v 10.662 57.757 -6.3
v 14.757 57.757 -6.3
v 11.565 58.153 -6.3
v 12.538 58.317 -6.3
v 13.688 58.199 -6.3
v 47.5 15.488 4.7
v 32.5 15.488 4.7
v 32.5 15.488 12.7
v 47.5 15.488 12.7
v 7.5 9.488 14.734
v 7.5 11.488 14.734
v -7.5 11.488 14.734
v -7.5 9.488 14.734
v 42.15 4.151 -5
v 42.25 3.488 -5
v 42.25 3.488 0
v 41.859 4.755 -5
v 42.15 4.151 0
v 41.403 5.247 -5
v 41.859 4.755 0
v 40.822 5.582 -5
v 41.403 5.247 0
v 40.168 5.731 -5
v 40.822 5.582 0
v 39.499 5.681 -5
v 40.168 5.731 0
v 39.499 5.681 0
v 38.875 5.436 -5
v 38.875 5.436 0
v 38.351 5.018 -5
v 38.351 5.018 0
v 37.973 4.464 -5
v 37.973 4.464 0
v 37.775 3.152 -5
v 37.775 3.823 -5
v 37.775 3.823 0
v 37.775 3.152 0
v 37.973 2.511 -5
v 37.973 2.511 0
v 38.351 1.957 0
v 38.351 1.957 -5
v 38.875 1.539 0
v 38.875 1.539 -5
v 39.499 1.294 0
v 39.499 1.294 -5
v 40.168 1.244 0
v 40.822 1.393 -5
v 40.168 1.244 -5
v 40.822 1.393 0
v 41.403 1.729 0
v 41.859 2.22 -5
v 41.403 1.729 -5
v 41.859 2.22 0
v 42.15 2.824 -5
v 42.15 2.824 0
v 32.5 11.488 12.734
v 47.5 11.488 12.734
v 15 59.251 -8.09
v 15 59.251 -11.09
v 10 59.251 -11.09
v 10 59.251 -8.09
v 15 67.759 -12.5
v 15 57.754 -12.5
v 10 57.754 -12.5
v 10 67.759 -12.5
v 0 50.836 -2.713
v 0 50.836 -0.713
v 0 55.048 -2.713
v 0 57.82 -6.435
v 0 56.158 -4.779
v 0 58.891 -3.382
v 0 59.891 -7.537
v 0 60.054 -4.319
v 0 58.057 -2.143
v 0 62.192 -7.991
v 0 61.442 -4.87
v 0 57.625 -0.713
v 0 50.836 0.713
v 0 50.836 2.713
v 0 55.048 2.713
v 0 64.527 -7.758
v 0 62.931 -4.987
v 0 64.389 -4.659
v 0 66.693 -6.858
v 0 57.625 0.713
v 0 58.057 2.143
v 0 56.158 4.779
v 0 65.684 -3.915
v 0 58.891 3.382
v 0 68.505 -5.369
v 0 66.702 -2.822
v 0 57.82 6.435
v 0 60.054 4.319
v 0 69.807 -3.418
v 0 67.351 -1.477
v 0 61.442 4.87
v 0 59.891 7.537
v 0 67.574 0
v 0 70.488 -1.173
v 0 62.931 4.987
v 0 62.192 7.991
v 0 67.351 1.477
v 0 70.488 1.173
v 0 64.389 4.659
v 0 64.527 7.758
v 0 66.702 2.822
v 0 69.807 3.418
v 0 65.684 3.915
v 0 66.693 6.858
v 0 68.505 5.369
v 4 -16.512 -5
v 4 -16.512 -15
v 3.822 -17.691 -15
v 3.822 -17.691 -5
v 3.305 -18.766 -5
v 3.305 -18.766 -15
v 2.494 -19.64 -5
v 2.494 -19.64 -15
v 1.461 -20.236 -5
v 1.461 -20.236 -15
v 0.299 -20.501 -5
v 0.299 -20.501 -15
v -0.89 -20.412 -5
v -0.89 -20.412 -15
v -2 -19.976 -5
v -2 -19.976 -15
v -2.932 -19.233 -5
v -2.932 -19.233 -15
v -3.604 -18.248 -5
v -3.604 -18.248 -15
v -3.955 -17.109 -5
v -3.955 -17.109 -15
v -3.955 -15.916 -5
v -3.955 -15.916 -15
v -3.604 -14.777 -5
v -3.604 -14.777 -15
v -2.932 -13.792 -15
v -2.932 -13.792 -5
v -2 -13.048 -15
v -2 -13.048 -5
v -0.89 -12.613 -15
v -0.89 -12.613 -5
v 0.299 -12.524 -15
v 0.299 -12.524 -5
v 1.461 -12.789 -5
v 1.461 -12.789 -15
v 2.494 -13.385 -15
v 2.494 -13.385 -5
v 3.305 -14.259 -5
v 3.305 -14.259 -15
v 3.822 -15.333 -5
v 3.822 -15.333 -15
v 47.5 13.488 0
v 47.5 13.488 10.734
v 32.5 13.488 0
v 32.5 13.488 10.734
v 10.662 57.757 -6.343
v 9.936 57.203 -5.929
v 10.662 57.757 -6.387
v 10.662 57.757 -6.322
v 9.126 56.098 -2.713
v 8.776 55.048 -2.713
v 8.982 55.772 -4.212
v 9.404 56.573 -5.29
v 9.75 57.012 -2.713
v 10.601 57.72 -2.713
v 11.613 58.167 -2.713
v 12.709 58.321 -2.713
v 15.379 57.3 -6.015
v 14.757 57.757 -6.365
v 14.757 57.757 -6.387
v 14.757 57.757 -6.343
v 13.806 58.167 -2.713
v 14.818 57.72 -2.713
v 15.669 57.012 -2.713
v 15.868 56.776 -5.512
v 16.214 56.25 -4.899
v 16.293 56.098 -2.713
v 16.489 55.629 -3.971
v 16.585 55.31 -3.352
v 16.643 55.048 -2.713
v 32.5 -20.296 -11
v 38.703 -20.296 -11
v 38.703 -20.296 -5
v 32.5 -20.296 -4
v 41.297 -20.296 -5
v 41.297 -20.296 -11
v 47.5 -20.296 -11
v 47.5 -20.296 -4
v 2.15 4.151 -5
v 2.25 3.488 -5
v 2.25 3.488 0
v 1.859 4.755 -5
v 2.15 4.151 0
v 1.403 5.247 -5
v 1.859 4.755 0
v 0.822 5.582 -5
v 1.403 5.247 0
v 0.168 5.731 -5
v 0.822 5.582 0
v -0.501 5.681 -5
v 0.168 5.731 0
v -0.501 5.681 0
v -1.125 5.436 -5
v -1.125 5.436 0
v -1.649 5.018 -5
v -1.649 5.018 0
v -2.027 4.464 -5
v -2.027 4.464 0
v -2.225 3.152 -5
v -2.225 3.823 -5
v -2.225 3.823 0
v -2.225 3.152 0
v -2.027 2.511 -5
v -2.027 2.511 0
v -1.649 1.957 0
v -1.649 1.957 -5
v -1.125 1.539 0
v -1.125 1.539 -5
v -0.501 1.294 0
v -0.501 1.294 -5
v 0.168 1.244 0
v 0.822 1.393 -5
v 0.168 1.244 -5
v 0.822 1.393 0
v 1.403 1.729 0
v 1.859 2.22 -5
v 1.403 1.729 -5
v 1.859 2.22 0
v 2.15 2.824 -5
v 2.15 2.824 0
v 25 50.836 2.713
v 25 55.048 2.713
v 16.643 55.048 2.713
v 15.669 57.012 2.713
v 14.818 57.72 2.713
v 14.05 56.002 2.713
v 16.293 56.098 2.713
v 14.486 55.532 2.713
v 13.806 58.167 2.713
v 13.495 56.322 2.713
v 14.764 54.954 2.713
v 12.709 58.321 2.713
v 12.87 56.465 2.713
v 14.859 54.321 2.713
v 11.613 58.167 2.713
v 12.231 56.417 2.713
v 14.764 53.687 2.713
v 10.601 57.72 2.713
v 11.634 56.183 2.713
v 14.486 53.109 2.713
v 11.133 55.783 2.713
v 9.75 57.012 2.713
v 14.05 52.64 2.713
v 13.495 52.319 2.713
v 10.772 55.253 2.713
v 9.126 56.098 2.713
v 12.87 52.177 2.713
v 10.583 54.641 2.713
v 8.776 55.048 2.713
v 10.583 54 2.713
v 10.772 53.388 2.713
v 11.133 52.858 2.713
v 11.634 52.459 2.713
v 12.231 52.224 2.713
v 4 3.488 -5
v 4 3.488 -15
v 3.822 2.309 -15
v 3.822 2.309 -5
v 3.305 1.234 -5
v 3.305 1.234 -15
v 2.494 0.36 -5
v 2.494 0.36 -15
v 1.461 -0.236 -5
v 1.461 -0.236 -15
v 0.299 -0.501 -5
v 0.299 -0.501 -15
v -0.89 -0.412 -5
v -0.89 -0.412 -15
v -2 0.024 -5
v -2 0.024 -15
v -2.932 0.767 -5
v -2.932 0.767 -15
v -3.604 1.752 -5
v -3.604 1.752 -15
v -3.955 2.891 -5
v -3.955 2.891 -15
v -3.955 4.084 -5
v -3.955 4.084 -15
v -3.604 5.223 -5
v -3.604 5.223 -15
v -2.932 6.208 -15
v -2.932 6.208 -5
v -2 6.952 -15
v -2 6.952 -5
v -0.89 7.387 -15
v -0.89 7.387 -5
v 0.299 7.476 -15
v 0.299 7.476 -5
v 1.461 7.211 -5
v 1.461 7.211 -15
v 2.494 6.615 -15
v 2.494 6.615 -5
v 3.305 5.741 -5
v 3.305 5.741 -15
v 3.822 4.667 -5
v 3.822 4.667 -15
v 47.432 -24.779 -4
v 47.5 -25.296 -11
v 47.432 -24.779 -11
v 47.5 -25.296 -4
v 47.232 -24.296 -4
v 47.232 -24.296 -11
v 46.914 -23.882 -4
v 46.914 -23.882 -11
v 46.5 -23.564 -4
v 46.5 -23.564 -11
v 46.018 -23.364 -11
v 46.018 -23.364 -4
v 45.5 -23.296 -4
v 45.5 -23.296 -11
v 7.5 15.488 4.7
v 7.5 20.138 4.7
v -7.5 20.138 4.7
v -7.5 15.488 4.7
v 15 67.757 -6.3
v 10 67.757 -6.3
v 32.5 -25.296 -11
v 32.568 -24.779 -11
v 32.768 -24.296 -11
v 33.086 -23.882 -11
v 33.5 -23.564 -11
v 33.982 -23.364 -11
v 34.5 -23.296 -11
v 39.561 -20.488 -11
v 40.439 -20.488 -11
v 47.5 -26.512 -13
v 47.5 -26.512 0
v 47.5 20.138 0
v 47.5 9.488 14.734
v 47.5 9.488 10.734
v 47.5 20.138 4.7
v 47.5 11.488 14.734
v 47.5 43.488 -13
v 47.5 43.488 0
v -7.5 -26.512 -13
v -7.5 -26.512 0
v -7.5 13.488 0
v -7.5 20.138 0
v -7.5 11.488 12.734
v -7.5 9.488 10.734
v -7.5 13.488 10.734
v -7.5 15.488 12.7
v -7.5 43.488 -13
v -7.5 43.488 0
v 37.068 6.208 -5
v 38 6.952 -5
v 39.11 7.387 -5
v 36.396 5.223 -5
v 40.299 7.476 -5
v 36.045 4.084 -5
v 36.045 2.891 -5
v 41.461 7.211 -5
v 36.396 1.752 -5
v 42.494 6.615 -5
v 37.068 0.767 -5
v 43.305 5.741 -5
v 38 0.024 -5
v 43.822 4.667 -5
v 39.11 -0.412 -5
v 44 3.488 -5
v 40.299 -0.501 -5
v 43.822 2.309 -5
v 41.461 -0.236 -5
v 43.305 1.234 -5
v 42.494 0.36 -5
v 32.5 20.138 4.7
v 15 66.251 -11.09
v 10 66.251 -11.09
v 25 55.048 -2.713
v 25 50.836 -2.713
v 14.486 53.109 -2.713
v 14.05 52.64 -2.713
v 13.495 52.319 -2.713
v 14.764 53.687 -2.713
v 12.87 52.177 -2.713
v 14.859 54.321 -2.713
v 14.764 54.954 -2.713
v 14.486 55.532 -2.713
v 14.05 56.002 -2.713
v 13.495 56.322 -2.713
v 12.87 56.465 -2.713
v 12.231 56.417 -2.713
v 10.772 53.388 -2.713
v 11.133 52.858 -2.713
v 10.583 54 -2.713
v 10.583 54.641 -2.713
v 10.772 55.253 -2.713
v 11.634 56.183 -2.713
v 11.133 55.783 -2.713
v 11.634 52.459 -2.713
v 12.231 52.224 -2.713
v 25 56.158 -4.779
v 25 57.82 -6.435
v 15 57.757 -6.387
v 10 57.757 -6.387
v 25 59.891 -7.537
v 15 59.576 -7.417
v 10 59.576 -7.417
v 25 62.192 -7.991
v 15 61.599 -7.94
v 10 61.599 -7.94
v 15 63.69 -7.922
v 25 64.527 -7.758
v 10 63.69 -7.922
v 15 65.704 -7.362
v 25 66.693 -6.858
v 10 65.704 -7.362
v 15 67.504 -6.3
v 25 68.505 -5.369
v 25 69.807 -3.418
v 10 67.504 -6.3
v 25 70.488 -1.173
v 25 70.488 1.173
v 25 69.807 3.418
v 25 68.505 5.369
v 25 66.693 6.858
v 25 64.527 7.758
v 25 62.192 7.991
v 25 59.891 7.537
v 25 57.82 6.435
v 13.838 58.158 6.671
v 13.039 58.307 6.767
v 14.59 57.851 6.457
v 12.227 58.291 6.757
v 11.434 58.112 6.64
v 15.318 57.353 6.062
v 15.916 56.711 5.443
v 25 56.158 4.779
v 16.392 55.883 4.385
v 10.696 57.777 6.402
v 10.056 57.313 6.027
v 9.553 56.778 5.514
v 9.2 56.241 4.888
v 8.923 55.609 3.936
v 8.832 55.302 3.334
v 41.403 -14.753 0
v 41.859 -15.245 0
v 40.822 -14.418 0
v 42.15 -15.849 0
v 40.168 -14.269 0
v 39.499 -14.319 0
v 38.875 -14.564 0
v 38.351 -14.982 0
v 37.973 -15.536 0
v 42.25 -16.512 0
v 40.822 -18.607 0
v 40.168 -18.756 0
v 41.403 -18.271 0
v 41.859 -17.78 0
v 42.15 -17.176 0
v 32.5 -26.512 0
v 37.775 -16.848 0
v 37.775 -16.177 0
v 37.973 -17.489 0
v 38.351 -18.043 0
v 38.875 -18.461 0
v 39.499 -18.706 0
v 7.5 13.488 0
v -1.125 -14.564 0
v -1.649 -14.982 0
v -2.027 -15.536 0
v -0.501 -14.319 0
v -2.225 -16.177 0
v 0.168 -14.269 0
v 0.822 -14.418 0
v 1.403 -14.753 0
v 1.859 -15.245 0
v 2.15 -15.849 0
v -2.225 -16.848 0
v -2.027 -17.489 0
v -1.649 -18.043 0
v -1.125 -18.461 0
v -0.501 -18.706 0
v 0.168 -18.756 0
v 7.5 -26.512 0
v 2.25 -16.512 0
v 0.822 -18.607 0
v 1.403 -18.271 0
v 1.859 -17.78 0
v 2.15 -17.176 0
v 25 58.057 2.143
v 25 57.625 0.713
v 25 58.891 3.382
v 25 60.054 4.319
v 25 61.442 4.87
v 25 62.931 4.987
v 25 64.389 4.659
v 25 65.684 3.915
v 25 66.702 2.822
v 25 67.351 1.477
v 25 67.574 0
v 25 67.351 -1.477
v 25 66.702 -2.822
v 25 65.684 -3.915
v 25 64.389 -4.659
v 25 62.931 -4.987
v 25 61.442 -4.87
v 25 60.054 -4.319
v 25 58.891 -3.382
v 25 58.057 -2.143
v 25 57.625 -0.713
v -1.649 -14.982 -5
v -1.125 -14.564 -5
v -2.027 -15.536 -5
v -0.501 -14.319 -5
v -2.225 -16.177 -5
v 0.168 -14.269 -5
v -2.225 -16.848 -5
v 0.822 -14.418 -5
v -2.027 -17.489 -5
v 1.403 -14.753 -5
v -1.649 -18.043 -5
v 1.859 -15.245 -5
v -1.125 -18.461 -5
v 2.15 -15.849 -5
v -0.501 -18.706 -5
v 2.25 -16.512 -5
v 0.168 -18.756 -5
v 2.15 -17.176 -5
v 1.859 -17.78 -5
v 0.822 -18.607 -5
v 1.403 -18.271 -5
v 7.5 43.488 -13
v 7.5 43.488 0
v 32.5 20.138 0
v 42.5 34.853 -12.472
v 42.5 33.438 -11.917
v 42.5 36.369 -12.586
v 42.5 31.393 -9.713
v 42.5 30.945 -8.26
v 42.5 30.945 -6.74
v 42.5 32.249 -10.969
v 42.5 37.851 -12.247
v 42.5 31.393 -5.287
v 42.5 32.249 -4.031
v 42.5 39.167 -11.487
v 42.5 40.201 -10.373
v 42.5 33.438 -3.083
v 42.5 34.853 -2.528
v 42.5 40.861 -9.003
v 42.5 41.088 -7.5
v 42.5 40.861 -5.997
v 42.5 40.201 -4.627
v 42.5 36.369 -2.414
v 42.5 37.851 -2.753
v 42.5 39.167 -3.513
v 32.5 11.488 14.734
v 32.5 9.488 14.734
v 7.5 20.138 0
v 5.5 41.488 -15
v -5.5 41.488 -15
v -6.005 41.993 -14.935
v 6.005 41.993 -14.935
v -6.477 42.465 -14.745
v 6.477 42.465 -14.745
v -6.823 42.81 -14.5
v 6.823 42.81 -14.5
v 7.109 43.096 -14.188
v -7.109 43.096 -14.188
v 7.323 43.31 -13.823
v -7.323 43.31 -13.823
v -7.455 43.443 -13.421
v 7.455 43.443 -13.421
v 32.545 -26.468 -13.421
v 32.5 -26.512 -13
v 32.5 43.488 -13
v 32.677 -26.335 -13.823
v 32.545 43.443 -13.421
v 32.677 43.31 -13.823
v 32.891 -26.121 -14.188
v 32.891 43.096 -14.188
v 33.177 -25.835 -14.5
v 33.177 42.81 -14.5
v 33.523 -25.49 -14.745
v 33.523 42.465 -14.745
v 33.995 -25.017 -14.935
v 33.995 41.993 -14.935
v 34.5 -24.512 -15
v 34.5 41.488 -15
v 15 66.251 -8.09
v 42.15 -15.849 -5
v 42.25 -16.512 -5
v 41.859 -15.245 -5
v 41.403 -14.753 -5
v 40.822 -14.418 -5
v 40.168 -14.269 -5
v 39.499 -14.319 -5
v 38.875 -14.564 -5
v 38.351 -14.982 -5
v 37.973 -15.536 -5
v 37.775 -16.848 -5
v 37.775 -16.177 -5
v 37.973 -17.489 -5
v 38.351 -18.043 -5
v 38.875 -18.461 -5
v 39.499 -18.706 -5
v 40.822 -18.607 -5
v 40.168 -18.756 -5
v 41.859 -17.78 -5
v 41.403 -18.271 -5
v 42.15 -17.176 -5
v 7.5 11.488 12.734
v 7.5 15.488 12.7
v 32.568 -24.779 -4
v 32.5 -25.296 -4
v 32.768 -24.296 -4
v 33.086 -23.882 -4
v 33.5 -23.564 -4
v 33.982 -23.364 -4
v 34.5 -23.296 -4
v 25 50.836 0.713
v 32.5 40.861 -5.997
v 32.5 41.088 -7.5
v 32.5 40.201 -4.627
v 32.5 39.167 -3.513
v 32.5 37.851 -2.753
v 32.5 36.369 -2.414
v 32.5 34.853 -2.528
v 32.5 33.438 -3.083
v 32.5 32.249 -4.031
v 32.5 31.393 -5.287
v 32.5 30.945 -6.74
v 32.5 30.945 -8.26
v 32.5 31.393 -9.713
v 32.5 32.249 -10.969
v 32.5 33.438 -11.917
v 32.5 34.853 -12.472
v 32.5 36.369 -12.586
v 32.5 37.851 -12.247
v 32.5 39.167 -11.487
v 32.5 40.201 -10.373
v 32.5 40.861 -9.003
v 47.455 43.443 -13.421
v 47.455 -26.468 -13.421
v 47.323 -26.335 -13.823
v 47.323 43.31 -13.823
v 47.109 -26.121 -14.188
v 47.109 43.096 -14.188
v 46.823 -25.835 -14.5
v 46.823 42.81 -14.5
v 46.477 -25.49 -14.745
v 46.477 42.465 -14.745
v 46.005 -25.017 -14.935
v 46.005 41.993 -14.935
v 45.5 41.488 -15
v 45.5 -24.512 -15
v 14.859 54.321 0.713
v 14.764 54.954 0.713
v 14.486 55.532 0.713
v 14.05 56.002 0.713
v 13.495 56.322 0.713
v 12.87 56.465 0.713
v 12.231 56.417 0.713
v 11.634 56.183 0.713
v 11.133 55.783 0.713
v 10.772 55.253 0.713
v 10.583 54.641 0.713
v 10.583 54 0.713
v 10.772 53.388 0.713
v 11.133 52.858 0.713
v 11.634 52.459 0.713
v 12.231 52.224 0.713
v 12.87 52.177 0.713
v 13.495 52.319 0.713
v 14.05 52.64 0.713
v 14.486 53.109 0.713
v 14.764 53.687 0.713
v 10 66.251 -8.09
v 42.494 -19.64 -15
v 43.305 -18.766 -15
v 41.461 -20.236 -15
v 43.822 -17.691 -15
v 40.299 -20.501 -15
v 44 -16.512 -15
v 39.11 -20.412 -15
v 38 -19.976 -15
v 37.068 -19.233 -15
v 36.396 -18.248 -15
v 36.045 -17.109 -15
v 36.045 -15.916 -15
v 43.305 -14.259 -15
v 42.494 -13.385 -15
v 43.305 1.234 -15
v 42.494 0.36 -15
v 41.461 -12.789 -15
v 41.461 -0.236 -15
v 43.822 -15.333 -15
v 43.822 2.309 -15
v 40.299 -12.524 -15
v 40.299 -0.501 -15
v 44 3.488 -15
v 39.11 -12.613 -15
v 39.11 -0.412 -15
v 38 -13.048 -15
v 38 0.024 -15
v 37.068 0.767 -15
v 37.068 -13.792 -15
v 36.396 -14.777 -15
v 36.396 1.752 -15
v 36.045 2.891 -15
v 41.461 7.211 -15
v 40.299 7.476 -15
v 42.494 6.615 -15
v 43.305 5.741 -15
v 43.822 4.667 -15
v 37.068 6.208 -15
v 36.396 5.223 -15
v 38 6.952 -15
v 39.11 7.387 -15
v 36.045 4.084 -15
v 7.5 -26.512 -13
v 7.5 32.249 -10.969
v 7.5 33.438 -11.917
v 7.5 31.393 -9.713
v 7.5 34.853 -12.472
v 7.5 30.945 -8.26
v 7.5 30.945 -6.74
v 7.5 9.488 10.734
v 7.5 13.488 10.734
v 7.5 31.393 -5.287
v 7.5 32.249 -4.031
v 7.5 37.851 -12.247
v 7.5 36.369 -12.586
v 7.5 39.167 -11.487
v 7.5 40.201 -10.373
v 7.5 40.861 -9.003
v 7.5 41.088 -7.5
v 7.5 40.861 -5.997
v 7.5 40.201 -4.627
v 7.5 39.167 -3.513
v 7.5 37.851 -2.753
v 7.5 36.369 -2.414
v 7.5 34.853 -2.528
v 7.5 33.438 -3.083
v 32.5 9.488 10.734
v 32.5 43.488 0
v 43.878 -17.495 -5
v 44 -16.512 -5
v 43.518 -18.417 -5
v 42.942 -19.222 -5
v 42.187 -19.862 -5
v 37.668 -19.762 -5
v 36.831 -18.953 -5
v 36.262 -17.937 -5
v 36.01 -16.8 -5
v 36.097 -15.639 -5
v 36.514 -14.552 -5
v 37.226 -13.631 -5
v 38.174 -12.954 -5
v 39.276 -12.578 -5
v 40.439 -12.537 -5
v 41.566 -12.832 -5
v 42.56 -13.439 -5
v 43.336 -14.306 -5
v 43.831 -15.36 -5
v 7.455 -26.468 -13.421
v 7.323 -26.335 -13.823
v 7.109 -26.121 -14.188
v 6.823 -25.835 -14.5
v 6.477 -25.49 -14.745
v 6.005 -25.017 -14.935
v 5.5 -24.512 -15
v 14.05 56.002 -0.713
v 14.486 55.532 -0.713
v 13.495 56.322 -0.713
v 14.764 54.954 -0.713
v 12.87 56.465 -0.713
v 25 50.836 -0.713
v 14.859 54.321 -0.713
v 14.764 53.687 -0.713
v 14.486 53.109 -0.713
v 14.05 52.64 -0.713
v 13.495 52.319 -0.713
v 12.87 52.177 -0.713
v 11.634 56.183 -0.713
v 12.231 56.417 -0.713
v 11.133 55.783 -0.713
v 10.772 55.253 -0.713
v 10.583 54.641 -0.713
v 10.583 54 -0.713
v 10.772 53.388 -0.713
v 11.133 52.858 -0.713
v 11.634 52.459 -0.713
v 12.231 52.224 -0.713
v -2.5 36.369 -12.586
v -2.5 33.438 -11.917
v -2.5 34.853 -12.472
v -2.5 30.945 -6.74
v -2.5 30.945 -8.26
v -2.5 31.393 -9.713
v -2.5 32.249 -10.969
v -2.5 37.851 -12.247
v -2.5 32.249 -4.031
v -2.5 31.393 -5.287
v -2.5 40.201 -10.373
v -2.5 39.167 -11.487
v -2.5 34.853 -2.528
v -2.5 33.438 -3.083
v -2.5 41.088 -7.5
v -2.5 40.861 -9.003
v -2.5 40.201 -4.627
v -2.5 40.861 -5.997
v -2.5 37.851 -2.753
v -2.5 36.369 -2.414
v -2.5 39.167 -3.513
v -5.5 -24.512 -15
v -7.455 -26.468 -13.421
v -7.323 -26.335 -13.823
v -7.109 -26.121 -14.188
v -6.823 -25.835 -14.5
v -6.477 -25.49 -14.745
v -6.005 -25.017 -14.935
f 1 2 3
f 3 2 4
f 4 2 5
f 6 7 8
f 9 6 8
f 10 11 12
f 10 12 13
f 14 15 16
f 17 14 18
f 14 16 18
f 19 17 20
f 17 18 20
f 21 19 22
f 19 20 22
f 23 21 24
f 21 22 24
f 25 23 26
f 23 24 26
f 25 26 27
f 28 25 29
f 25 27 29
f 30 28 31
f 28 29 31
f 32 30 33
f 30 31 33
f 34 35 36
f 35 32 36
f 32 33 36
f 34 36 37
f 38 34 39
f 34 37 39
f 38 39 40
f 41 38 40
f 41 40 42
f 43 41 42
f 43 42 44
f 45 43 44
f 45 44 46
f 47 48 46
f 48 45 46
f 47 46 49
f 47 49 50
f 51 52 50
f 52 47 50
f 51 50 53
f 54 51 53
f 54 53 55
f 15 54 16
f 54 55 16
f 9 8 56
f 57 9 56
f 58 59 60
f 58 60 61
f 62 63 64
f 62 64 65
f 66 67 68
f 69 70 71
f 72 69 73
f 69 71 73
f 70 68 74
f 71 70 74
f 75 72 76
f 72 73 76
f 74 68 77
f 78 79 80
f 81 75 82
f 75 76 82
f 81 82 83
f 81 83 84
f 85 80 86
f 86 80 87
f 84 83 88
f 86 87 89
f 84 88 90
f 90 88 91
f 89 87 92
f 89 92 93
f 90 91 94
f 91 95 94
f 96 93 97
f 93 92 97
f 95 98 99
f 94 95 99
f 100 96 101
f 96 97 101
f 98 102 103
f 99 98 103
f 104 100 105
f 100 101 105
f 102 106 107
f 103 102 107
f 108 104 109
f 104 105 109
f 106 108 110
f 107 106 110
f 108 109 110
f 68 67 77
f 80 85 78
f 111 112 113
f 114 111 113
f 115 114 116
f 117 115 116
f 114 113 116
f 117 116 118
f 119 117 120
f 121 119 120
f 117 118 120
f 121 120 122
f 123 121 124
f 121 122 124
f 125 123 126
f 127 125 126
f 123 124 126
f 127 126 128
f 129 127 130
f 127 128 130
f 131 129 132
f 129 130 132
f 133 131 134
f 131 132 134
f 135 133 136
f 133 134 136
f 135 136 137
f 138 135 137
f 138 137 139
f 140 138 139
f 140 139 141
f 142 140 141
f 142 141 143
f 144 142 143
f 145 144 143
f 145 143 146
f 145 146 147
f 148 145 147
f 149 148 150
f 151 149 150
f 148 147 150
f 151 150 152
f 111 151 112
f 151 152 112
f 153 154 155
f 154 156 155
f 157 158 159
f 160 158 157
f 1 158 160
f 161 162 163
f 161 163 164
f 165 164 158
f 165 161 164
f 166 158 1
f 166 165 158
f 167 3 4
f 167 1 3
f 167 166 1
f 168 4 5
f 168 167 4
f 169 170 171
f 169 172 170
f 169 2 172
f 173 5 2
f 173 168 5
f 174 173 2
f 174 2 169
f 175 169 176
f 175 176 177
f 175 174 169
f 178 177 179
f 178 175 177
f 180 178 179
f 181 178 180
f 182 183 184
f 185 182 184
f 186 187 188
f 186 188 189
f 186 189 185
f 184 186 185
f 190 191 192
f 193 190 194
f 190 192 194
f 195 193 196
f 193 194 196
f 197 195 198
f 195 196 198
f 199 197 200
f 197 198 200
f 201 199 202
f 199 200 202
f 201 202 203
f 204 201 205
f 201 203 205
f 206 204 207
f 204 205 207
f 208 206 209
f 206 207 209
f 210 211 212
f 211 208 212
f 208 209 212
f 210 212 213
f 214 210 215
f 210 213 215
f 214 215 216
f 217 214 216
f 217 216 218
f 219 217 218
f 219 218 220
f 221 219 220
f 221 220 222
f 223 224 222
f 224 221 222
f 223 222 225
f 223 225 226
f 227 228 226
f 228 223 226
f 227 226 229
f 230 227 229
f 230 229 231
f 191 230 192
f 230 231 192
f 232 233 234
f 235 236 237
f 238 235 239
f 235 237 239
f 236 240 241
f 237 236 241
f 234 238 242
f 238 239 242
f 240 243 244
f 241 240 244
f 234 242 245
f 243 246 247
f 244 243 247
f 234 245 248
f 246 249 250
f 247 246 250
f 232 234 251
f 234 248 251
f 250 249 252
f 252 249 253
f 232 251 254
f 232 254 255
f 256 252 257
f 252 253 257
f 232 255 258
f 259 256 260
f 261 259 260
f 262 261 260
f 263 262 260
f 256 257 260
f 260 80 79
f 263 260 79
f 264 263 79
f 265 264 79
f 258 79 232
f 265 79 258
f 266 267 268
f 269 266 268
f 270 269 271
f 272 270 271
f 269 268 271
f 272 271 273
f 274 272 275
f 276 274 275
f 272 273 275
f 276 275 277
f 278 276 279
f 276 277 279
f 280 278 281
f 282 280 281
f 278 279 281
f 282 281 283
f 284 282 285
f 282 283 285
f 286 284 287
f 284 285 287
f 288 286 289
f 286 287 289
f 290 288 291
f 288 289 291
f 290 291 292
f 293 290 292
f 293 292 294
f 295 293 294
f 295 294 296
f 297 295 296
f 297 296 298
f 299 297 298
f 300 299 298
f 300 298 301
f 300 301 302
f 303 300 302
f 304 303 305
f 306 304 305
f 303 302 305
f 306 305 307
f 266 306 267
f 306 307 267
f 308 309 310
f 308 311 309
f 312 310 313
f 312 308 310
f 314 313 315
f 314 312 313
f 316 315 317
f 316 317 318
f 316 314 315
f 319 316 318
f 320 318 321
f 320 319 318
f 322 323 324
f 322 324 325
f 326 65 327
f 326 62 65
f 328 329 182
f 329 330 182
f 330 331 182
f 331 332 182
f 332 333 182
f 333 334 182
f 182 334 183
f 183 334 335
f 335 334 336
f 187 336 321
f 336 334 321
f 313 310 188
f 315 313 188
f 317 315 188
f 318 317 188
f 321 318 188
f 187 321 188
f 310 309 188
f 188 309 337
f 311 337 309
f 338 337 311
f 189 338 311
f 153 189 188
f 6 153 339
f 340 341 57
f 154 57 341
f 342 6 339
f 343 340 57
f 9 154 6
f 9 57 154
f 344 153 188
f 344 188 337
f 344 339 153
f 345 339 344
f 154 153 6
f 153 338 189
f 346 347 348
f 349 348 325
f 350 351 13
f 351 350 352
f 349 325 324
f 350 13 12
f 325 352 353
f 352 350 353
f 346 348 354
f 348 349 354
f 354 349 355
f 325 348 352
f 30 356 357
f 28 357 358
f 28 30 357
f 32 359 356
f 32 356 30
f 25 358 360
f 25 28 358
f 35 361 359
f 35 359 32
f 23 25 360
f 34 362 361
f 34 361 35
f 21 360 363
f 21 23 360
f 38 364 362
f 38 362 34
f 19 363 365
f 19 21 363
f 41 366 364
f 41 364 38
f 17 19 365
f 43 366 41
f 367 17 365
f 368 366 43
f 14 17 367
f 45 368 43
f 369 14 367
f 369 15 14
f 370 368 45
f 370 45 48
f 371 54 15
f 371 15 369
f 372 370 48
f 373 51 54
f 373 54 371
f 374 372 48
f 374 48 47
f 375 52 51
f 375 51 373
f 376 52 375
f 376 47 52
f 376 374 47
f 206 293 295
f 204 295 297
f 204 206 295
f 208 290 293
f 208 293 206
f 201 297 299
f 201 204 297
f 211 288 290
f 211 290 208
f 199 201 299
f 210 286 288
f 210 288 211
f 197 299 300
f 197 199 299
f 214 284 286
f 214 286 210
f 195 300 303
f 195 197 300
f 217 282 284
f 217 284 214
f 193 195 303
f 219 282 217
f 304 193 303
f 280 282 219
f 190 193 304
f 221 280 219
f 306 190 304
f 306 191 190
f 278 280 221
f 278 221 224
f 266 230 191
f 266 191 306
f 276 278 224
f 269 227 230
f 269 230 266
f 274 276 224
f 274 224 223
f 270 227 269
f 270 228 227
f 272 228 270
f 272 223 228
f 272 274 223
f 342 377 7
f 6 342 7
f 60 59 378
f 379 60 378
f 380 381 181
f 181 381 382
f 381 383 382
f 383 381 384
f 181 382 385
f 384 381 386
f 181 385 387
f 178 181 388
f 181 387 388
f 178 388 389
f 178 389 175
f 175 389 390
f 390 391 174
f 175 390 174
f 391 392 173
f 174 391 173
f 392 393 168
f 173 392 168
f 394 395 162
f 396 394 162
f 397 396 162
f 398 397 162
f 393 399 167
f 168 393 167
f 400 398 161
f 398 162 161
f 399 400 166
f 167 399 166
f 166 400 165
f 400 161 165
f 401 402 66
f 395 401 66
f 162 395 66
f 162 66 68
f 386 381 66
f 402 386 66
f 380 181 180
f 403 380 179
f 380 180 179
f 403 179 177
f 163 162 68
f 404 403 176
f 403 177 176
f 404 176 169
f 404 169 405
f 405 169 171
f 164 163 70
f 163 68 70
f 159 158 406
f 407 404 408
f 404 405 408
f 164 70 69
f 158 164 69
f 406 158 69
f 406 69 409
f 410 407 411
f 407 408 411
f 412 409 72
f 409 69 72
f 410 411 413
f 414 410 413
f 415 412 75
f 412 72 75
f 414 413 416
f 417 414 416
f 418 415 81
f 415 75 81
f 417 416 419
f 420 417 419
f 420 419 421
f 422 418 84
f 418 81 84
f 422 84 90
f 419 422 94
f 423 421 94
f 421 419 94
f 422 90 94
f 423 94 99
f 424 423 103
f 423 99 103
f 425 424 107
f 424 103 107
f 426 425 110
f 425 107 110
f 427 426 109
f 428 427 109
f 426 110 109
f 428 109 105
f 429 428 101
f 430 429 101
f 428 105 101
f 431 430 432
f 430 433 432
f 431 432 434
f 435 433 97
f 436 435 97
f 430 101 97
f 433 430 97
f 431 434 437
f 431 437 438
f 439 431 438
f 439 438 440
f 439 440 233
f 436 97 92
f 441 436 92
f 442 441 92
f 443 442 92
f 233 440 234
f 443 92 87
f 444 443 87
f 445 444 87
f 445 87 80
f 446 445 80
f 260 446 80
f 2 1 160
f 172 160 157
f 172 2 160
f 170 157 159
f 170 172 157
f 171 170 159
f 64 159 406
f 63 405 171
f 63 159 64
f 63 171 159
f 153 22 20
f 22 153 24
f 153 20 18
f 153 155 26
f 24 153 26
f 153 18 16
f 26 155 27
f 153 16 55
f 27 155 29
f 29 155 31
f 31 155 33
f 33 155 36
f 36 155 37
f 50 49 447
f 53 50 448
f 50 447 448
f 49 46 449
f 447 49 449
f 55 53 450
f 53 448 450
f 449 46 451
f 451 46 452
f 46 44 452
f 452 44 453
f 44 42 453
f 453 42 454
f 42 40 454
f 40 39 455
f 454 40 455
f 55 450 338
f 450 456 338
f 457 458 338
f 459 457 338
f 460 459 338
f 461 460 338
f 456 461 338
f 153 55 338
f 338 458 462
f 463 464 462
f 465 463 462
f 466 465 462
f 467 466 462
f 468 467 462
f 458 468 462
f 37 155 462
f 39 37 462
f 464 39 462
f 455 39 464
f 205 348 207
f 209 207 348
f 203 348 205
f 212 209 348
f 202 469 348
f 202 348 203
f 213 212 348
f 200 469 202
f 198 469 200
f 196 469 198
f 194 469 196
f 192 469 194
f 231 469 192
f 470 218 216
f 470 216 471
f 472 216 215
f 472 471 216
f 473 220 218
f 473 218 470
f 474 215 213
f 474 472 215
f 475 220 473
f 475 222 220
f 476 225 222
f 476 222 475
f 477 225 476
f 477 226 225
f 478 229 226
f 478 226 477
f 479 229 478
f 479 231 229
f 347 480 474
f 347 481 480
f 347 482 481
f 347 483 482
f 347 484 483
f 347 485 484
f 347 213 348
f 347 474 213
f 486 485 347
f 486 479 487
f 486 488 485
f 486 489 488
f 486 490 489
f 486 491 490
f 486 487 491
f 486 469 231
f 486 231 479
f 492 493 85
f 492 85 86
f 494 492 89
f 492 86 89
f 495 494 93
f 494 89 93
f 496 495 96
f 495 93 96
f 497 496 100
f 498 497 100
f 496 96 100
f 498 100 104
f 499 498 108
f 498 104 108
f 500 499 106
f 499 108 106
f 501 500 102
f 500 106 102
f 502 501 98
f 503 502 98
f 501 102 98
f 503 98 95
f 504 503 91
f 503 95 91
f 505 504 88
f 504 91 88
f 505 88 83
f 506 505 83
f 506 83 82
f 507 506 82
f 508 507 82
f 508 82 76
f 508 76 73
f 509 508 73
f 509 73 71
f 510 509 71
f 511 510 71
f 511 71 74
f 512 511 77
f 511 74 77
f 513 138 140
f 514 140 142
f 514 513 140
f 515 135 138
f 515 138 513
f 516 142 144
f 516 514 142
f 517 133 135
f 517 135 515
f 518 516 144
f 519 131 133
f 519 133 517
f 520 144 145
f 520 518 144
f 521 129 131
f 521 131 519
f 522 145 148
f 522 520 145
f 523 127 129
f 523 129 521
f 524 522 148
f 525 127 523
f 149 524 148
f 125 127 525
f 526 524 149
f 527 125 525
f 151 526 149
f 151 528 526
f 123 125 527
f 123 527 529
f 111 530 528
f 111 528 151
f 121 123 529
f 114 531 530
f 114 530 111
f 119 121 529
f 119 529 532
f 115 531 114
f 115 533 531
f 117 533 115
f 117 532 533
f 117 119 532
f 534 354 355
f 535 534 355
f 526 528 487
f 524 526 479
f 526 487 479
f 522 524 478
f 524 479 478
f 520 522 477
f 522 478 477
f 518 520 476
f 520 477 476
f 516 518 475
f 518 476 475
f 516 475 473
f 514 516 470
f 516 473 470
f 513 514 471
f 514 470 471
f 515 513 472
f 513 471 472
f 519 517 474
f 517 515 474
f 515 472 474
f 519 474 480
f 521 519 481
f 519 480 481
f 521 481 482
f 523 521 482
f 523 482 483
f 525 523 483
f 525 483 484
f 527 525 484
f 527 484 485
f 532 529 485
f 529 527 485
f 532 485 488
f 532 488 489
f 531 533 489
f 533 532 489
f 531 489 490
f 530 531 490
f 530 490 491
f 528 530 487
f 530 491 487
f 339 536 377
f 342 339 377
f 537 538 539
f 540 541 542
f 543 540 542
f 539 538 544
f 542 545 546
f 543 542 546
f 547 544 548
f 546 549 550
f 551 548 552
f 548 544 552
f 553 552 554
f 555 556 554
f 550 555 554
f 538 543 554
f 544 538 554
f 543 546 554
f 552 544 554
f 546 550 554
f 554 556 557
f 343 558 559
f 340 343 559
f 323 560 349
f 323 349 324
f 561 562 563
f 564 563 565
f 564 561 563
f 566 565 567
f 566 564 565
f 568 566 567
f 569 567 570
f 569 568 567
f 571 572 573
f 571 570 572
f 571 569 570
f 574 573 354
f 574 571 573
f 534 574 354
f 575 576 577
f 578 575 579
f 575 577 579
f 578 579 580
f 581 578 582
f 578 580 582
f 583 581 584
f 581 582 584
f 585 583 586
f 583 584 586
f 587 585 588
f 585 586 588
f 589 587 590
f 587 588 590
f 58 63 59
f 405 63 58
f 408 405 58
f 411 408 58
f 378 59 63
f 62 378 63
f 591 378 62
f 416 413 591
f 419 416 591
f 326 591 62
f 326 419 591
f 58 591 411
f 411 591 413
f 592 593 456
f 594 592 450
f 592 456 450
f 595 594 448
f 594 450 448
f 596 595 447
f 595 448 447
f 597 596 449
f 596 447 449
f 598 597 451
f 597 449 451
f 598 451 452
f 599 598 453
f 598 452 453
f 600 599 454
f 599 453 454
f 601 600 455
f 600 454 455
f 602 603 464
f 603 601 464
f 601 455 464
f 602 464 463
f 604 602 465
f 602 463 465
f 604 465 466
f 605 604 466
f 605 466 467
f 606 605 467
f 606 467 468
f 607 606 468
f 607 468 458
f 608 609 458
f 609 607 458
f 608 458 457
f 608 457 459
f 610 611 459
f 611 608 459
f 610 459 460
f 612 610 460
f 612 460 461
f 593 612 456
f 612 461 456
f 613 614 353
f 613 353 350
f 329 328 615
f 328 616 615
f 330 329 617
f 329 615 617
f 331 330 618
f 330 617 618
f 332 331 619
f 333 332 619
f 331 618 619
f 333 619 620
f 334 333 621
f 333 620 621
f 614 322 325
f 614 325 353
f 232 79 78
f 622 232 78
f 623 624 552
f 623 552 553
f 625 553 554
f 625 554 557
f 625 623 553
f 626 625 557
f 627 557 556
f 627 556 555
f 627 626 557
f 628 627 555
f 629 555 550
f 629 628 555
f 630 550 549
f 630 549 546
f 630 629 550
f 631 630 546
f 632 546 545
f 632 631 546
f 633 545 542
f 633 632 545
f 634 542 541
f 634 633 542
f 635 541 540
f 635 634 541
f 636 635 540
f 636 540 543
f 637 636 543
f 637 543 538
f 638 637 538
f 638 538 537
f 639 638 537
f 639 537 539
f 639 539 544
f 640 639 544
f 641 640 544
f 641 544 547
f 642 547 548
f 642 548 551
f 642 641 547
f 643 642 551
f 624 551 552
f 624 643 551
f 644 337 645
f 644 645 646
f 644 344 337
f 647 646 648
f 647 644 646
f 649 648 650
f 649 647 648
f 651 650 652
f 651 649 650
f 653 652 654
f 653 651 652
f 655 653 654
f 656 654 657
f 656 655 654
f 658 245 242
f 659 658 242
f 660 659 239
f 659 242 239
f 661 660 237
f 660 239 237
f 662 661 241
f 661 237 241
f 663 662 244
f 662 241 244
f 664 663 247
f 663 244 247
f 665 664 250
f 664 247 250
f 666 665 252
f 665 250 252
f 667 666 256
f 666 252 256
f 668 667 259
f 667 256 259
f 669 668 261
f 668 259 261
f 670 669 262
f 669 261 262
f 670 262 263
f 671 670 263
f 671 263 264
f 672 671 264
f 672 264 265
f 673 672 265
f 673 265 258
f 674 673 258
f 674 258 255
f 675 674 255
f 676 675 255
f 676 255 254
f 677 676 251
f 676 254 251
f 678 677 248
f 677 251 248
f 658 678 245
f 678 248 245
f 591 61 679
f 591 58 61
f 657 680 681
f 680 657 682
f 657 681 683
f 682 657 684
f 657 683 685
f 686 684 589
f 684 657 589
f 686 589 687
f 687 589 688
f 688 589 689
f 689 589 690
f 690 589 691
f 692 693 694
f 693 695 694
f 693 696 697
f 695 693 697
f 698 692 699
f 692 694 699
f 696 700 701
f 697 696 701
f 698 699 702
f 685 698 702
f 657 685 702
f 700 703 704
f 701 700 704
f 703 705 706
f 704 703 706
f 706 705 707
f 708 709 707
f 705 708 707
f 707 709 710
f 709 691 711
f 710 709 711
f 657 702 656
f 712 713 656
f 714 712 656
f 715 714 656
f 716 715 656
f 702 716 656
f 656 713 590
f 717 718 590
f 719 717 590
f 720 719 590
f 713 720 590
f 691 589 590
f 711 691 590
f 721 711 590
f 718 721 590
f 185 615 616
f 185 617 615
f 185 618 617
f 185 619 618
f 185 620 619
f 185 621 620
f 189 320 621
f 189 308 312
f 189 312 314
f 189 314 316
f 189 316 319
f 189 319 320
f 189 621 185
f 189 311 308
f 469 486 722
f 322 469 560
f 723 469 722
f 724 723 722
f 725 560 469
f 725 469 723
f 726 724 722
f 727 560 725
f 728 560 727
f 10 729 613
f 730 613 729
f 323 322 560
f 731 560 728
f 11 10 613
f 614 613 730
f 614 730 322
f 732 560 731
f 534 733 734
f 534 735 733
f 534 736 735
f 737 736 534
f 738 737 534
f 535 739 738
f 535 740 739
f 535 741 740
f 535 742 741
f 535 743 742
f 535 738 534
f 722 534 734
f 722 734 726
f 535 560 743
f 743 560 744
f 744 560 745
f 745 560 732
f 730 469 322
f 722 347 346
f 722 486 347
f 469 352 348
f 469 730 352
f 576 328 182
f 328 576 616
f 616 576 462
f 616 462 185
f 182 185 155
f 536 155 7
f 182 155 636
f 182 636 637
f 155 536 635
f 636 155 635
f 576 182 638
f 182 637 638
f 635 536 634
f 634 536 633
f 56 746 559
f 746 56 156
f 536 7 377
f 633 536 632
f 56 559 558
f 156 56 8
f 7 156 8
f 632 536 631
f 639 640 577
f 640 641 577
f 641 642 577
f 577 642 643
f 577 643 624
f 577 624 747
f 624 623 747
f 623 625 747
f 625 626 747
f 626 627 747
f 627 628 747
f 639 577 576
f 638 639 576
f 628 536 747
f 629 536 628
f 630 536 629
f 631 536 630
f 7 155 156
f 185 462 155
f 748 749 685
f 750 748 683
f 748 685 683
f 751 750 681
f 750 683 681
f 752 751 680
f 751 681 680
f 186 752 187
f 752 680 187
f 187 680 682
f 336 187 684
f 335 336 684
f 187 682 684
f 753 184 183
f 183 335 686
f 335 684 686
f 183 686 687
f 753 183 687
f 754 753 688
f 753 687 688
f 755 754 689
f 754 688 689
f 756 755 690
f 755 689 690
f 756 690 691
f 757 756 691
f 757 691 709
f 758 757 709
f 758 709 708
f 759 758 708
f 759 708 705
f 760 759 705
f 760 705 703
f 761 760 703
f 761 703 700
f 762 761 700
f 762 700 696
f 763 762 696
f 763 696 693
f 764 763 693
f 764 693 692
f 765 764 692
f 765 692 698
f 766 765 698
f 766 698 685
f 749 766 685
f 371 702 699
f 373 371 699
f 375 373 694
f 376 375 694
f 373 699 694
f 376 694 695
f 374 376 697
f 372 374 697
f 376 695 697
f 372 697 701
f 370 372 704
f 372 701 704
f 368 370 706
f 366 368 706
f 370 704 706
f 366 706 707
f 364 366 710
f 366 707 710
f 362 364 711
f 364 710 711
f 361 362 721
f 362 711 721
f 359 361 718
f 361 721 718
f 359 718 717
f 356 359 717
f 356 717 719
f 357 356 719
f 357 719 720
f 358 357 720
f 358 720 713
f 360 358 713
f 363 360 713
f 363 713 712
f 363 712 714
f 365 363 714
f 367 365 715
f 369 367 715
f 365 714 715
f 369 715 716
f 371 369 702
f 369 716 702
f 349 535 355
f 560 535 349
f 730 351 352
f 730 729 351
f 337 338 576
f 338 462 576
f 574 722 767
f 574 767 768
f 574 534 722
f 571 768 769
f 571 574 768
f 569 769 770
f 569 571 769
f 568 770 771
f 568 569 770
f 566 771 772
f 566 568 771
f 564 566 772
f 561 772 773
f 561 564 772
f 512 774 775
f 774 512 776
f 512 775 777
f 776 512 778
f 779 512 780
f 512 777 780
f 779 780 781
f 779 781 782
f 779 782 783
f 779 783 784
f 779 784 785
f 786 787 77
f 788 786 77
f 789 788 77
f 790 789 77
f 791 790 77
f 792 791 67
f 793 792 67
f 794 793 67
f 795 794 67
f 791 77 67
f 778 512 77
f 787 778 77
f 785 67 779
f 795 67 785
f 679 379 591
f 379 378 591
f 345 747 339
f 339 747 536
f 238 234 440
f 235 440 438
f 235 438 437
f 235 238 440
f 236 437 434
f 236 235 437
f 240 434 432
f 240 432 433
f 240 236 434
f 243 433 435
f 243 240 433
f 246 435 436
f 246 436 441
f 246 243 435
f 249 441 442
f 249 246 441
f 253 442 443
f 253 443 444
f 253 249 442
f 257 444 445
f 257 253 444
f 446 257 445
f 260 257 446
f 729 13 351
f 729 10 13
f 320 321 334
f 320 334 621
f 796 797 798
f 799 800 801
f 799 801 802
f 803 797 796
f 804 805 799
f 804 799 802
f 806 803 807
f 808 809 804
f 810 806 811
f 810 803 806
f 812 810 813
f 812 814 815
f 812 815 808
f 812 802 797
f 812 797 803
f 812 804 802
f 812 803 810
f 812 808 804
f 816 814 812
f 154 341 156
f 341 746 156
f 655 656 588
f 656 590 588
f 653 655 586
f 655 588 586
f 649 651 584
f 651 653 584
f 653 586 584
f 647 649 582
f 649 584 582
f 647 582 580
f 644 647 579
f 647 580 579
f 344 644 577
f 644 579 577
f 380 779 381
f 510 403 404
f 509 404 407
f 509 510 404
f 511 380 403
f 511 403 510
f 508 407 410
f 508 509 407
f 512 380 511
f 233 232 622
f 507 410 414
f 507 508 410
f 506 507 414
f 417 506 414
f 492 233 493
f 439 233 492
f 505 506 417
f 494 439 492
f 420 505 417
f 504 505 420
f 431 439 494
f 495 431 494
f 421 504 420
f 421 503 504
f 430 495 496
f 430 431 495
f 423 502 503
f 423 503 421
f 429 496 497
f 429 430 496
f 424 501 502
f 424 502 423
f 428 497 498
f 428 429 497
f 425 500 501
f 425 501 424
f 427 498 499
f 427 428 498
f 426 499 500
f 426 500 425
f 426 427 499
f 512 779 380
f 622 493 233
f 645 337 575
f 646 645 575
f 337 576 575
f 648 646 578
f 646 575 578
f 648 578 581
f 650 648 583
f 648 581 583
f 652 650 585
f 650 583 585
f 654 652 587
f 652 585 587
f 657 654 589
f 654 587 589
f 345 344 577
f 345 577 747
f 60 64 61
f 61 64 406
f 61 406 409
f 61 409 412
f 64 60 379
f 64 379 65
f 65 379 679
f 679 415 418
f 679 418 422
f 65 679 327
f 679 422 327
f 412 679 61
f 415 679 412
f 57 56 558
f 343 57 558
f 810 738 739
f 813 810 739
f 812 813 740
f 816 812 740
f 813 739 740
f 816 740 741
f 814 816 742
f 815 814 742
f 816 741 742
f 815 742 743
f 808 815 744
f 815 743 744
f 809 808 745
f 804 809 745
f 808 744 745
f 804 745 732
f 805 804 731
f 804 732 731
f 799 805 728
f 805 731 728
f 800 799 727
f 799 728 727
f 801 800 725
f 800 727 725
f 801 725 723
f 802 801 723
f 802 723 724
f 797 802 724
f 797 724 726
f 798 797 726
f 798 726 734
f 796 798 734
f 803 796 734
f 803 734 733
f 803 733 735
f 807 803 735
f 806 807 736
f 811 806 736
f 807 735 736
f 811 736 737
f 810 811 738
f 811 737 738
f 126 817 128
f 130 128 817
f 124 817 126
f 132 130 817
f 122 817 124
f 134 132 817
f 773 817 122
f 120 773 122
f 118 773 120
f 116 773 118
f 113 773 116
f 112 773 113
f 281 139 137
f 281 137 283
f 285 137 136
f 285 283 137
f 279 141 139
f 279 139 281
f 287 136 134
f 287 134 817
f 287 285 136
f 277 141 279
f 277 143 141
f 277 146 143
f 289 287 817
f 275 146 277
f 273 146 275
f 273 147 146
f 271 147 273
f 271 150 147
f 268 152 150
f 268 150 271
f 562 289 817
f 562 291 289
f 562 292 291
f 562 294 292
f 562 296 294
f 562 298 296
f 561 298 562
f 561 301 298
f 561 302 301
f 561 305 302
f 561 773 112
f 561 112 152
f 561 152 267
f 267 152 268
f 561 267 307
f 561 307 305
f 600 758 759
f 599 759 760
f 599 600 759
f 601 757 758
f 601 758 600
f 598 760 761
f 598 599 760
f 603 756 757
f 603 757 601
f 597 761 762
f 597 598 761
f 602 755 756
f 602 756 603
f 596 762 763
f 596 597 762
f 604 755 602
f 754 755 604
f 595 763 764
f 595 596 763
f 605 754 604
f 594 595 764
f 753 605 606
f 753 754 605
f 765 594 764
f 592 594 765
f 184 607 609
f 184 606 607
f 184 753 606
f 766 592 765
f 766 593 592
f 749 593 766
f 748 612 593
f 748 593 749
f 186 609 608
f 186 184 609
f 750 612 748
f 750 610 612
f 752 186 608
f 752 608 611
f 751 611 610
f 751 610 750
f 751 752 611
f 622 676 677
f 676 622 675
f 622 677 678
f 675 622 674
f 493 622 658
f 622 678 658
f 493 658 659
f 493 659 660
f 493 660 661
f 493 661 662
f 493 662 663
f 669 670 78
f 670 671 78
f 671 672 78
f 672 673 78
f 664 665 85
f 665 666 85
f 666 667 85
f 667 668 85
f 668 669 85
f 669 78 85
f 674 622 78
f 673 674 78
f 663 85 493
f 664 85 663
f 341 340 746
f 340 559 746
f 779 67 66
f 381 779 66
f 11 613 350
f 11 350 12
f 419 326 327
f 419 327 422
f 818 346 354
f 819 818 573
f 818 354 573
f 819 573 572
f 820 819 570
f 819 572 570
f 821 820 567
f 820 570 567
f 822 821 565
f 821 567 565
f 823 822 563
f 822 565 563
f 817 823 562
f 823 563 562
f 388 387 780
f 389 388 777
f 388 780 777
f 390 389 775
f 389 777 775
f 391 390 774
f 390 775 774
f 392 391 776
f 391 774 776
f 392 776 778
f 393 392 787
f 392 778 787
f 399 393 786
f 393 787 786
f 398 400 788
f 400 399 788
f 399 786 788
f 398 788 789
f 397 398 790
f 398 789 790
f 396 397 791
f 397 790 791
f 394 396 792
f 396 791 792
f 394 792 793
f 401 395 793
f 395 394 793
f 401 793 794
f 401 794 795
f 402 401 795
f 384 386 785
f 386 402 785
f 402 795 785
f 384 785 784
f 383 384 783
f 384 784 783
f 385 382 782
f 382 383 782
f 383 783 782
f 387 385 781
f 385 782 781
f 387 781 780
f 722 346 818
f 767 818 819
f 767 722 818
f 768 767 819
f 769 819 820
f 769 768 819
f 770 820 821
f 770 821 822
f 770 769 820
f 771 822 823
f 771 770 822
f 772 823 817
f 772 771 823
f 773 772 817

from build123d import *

# Parameters (mm, degrees)
F2_DEPTH  = 7.5
F3_R      = 5.1
F4_DEPTH  = 10
F7_W      = 3
F7_H      = 7
F8_DEPTH  = 15
F9_R      = 2
F9_2_R    = 2
F10_R     = 2.25
F11_DEPTH = 15
F12_R     = 2.25
F13_DEPTH = 15
F14_R     = 4
F14_R_2   = 2.25
F15_DEPTH = 10
F16_R     = 4
F16_R_2   = 2.25
F17_DEPTH = 10
F19_DEPTH = 25
F20_R     = 2.15
F21_DEPTH = 12.5
F22_R     = 4
F23_DEPTH = 25
F24_R     = 4
F25_DEPTH = 25
F27_W     = 7
F27_H     = 3
F28_DEPTH = 2.5


with BuildPart() as f2:
    # F1 (on Right) → F2 (new body, symmetric)
    with BuildSketch(Plane.YZ):
        Polygon((13.4876342118, 10.7337733775), (13.4876342118, 0), (-26.5123657882, 0), (-26.5123657882, -15), (18.4876342118, -15), (43.4876342118, -15), (43.4876342118, 0), (20.1378133701, 0), (20.1378133701, 4.7), (15.4876342118, 4.7), (15.4876342118, 12.7), (11.4876342118, 12.7337733775), (11.4876342118, 14.7337733775), (9.4876342118, 14.7337733775), (9.4876342118, 10.7337733775), align=None)
    extrude(amount=F2_DEPTH, both=True)

    # F3 (on face) → F4 (cut)
    with BuildSketch(Plane.YZ.offset(7.5)):
        with Locations((35.9876342118, -7.5)):
            Circle(F3_R)
    extrude(amount=-F4_DEPTH, mode=Mode.SUBTRACT)


with BuildPart() as f6_1:
    # F6: instance of F2
    add(f2.part.mirror(Plane.YZ.offset(20)))

    # F7 (on face) → F8 (cut, through all)
    with BuildSketch(Plane.YZ.offset(47.5)):
        with Locations((-21.7961885631, -7.5)):
            Rectangle(F7_W, F7_H)
    extrude(amount=-F8_DEPTH, mode=Mode.SUBTRACT)

    # F9
    f9_edges = [f6_1.edges().sort_by_distance(p)[0] for p in [
        (47.5, -23.296189, -7.5),
        (32.5, -23.296189, -7.5),
        (32.5, 8.487634, -15),
        (47.5, 8.487634, -15),
        (40, -26.512366, -15),
        (40, 43.487634, -15),
    ]]
    fillet(f9_edges, radius=F9_R)

    # F12 (on face) → F13 (cut, through all)
    with BuildSketch(Plane.XY):
        with Locations((40, 3.4876342118)):
            Circle(F12_R)
        with Locations((40, -16.5123657882)):
            Circle(F12_R)
    extrude(amount=-F13_DEPTH, mode=Mode.SUBTRACT)

    # F14 (on face) → F15 (cut)
    with BuildSketch(Plane(origin=(0, 0, -15), x_dir=(1, 0, 0), z_dir=(0, 0, -1))):
        with Locations((40, -3.4876342116)):
            Circle(F14_R)
        with Locations((40, -3.4876342118)):
            Circle(F14_R_2, mode=Mode.SUBTRACT)
        with Locations((40, 16.5123657884)):
            Circle(F14_R)
        with Locations((40, 16.5123657882)):
            Circle(F14_R_2, mode=Mode.SUBTRACT)
    extrude(amount=-F15_DEPTH, mode=Mode.SUBTRACT)


with BuildPart() as f2_1:
    add(f2.part)

    # F9#2
    f9_2_edges = [f2_1.edges().sort_by_distance(p)[0] for p in [
        (-7.5, 8.487634, -15),
        (7.5, 8.487634, -15),
        (0, -26.512366, -15),
        (0, 43.487634, -15),
    ]]
    fillet(f9_2_edges, radius=F9_2_R)

    # F10 (on face) → F11 (cut, through all)
    with BuildSketch(Plane.XY):
        with Locations((0, 3.4876342118)):
            Circle(F10_R)
        with Locations((0, -16.5123657882)):
            Circle(F10_R)
    extrude(amount=-F11_DEPTH, mode=Mode.SUBTRACT)

    # F16 (on face) → F17 (cut)
    with BuildSketch(Plane(origin=(0, 0, -15), x_dir=(1, 0, 0), z_dir=(0, 0, -1))):
        with Locations((0, -3.4876342116)):
            Circle(F16_R)
        with Locations((0, -3.4876342118)):
            Circle(F16_R_2, mode=Mode.SUBTRACT)
        with Locations((0, 16.5123657884)):
            Circle(F16_R)
        with Locations((0, 16.5123657882)):
            Circle(F16_R_2, mode=Mode.SUBTRACT)
    extrude(amount=-F17_DEPTH, mode=Mode.SUBTRACT)


with BuildPart() as f19:
    # F18 (on Right) → F19 (new body)
    with BuildSketch(Plane.YZ):
        with BuildLine():
            ThreePointArc((57.6251018052, 0.7129804788), (67.5740066171, 0), (57.6251018052, -0.7129804788))
            Line((57.6251018052, -0.7129804788), (54.6058412801, -0.7129804788))
            Line((54.6058412801, -0.7129804788), (50.8355336492, -0.7129804788))
            Line((50.8355336492, -0.7129804788), (50.8355336492, -2.7129804788))
            Line((50.8355336492, -2.7129804788), (55.0480690063, -2.7129804788))
            ThreePointArc((55.0480690063, -2.7129804788), (70.5740066171, 0), (55.0480690063, 2.7129804788))
            Line((55.0480690063, 2.7129804788), (50.8355336492, 2.7129804788))
            Line((50.8355336492, 2.7129804788), (50.8355336492, 0.7129804788))
            Line((50.8355336492, 0.7129804788), (54.6058412801, 0.7129804788))
            Line((54.6058412801, 0.7129804788), (57.6251018052, 0.7129804788))
        make_face()
    extrude(amount=F19_DEPTH)

    # F20 (on Top) → F21 (cut, symmetric)
    with BuildSketch(Plane.XY):
        with Locations((12.7094546333, 54.3205924332)):
            Circle(F20_R)
    extrude(amount=F21_DEPTH, both=True, mode=Mode.SUBTRACT)

    # F22 (on face) → F23 (cut)
    with BuildSketch(Plane(origin=(0, 0, -2.7129804788), x_dir=(1, 0, 0), z_dir=(0, 0, -1))):
        with Locations((12.7094546333, -54.3205924332)):
            Circle(F22_R)
    extrude(amount=F23_DEPTH, mode=Mode.SUBTRACT)

    # F24 (on face) → F25 (cut)
    with BuildSketch(Plane.XY.offset(2.7129804788)):
        with Locations((12.7094546333, 54.3205924332)):
            Circle(F24_R)
    extrude(amount=F25_DEPTH, mode=Mode.SUBTRACT)

    # F27 (on offset) → F28 (join, symmetric)
    with BuildSketch(Plane.YZ.offset(12.5)):
        Polygon((62.7566805045, -6.3022147063), (57.7566809952, -6.2999995425), (57.7539344066, -12.4995148507), (67.7594266024, -12.4995148507), (67.7566800138, -6.2999995425), align=None)
        with Locations((62.7512938596, -9.5898995645)):
            Rectangle(F27_W, F27_H, mode=Mode.SUBTRACT)
    extrude(amount=F28_DEPTH, both=True)


solid = Compound([f6_1.part, f2_1.part, f19.part])
